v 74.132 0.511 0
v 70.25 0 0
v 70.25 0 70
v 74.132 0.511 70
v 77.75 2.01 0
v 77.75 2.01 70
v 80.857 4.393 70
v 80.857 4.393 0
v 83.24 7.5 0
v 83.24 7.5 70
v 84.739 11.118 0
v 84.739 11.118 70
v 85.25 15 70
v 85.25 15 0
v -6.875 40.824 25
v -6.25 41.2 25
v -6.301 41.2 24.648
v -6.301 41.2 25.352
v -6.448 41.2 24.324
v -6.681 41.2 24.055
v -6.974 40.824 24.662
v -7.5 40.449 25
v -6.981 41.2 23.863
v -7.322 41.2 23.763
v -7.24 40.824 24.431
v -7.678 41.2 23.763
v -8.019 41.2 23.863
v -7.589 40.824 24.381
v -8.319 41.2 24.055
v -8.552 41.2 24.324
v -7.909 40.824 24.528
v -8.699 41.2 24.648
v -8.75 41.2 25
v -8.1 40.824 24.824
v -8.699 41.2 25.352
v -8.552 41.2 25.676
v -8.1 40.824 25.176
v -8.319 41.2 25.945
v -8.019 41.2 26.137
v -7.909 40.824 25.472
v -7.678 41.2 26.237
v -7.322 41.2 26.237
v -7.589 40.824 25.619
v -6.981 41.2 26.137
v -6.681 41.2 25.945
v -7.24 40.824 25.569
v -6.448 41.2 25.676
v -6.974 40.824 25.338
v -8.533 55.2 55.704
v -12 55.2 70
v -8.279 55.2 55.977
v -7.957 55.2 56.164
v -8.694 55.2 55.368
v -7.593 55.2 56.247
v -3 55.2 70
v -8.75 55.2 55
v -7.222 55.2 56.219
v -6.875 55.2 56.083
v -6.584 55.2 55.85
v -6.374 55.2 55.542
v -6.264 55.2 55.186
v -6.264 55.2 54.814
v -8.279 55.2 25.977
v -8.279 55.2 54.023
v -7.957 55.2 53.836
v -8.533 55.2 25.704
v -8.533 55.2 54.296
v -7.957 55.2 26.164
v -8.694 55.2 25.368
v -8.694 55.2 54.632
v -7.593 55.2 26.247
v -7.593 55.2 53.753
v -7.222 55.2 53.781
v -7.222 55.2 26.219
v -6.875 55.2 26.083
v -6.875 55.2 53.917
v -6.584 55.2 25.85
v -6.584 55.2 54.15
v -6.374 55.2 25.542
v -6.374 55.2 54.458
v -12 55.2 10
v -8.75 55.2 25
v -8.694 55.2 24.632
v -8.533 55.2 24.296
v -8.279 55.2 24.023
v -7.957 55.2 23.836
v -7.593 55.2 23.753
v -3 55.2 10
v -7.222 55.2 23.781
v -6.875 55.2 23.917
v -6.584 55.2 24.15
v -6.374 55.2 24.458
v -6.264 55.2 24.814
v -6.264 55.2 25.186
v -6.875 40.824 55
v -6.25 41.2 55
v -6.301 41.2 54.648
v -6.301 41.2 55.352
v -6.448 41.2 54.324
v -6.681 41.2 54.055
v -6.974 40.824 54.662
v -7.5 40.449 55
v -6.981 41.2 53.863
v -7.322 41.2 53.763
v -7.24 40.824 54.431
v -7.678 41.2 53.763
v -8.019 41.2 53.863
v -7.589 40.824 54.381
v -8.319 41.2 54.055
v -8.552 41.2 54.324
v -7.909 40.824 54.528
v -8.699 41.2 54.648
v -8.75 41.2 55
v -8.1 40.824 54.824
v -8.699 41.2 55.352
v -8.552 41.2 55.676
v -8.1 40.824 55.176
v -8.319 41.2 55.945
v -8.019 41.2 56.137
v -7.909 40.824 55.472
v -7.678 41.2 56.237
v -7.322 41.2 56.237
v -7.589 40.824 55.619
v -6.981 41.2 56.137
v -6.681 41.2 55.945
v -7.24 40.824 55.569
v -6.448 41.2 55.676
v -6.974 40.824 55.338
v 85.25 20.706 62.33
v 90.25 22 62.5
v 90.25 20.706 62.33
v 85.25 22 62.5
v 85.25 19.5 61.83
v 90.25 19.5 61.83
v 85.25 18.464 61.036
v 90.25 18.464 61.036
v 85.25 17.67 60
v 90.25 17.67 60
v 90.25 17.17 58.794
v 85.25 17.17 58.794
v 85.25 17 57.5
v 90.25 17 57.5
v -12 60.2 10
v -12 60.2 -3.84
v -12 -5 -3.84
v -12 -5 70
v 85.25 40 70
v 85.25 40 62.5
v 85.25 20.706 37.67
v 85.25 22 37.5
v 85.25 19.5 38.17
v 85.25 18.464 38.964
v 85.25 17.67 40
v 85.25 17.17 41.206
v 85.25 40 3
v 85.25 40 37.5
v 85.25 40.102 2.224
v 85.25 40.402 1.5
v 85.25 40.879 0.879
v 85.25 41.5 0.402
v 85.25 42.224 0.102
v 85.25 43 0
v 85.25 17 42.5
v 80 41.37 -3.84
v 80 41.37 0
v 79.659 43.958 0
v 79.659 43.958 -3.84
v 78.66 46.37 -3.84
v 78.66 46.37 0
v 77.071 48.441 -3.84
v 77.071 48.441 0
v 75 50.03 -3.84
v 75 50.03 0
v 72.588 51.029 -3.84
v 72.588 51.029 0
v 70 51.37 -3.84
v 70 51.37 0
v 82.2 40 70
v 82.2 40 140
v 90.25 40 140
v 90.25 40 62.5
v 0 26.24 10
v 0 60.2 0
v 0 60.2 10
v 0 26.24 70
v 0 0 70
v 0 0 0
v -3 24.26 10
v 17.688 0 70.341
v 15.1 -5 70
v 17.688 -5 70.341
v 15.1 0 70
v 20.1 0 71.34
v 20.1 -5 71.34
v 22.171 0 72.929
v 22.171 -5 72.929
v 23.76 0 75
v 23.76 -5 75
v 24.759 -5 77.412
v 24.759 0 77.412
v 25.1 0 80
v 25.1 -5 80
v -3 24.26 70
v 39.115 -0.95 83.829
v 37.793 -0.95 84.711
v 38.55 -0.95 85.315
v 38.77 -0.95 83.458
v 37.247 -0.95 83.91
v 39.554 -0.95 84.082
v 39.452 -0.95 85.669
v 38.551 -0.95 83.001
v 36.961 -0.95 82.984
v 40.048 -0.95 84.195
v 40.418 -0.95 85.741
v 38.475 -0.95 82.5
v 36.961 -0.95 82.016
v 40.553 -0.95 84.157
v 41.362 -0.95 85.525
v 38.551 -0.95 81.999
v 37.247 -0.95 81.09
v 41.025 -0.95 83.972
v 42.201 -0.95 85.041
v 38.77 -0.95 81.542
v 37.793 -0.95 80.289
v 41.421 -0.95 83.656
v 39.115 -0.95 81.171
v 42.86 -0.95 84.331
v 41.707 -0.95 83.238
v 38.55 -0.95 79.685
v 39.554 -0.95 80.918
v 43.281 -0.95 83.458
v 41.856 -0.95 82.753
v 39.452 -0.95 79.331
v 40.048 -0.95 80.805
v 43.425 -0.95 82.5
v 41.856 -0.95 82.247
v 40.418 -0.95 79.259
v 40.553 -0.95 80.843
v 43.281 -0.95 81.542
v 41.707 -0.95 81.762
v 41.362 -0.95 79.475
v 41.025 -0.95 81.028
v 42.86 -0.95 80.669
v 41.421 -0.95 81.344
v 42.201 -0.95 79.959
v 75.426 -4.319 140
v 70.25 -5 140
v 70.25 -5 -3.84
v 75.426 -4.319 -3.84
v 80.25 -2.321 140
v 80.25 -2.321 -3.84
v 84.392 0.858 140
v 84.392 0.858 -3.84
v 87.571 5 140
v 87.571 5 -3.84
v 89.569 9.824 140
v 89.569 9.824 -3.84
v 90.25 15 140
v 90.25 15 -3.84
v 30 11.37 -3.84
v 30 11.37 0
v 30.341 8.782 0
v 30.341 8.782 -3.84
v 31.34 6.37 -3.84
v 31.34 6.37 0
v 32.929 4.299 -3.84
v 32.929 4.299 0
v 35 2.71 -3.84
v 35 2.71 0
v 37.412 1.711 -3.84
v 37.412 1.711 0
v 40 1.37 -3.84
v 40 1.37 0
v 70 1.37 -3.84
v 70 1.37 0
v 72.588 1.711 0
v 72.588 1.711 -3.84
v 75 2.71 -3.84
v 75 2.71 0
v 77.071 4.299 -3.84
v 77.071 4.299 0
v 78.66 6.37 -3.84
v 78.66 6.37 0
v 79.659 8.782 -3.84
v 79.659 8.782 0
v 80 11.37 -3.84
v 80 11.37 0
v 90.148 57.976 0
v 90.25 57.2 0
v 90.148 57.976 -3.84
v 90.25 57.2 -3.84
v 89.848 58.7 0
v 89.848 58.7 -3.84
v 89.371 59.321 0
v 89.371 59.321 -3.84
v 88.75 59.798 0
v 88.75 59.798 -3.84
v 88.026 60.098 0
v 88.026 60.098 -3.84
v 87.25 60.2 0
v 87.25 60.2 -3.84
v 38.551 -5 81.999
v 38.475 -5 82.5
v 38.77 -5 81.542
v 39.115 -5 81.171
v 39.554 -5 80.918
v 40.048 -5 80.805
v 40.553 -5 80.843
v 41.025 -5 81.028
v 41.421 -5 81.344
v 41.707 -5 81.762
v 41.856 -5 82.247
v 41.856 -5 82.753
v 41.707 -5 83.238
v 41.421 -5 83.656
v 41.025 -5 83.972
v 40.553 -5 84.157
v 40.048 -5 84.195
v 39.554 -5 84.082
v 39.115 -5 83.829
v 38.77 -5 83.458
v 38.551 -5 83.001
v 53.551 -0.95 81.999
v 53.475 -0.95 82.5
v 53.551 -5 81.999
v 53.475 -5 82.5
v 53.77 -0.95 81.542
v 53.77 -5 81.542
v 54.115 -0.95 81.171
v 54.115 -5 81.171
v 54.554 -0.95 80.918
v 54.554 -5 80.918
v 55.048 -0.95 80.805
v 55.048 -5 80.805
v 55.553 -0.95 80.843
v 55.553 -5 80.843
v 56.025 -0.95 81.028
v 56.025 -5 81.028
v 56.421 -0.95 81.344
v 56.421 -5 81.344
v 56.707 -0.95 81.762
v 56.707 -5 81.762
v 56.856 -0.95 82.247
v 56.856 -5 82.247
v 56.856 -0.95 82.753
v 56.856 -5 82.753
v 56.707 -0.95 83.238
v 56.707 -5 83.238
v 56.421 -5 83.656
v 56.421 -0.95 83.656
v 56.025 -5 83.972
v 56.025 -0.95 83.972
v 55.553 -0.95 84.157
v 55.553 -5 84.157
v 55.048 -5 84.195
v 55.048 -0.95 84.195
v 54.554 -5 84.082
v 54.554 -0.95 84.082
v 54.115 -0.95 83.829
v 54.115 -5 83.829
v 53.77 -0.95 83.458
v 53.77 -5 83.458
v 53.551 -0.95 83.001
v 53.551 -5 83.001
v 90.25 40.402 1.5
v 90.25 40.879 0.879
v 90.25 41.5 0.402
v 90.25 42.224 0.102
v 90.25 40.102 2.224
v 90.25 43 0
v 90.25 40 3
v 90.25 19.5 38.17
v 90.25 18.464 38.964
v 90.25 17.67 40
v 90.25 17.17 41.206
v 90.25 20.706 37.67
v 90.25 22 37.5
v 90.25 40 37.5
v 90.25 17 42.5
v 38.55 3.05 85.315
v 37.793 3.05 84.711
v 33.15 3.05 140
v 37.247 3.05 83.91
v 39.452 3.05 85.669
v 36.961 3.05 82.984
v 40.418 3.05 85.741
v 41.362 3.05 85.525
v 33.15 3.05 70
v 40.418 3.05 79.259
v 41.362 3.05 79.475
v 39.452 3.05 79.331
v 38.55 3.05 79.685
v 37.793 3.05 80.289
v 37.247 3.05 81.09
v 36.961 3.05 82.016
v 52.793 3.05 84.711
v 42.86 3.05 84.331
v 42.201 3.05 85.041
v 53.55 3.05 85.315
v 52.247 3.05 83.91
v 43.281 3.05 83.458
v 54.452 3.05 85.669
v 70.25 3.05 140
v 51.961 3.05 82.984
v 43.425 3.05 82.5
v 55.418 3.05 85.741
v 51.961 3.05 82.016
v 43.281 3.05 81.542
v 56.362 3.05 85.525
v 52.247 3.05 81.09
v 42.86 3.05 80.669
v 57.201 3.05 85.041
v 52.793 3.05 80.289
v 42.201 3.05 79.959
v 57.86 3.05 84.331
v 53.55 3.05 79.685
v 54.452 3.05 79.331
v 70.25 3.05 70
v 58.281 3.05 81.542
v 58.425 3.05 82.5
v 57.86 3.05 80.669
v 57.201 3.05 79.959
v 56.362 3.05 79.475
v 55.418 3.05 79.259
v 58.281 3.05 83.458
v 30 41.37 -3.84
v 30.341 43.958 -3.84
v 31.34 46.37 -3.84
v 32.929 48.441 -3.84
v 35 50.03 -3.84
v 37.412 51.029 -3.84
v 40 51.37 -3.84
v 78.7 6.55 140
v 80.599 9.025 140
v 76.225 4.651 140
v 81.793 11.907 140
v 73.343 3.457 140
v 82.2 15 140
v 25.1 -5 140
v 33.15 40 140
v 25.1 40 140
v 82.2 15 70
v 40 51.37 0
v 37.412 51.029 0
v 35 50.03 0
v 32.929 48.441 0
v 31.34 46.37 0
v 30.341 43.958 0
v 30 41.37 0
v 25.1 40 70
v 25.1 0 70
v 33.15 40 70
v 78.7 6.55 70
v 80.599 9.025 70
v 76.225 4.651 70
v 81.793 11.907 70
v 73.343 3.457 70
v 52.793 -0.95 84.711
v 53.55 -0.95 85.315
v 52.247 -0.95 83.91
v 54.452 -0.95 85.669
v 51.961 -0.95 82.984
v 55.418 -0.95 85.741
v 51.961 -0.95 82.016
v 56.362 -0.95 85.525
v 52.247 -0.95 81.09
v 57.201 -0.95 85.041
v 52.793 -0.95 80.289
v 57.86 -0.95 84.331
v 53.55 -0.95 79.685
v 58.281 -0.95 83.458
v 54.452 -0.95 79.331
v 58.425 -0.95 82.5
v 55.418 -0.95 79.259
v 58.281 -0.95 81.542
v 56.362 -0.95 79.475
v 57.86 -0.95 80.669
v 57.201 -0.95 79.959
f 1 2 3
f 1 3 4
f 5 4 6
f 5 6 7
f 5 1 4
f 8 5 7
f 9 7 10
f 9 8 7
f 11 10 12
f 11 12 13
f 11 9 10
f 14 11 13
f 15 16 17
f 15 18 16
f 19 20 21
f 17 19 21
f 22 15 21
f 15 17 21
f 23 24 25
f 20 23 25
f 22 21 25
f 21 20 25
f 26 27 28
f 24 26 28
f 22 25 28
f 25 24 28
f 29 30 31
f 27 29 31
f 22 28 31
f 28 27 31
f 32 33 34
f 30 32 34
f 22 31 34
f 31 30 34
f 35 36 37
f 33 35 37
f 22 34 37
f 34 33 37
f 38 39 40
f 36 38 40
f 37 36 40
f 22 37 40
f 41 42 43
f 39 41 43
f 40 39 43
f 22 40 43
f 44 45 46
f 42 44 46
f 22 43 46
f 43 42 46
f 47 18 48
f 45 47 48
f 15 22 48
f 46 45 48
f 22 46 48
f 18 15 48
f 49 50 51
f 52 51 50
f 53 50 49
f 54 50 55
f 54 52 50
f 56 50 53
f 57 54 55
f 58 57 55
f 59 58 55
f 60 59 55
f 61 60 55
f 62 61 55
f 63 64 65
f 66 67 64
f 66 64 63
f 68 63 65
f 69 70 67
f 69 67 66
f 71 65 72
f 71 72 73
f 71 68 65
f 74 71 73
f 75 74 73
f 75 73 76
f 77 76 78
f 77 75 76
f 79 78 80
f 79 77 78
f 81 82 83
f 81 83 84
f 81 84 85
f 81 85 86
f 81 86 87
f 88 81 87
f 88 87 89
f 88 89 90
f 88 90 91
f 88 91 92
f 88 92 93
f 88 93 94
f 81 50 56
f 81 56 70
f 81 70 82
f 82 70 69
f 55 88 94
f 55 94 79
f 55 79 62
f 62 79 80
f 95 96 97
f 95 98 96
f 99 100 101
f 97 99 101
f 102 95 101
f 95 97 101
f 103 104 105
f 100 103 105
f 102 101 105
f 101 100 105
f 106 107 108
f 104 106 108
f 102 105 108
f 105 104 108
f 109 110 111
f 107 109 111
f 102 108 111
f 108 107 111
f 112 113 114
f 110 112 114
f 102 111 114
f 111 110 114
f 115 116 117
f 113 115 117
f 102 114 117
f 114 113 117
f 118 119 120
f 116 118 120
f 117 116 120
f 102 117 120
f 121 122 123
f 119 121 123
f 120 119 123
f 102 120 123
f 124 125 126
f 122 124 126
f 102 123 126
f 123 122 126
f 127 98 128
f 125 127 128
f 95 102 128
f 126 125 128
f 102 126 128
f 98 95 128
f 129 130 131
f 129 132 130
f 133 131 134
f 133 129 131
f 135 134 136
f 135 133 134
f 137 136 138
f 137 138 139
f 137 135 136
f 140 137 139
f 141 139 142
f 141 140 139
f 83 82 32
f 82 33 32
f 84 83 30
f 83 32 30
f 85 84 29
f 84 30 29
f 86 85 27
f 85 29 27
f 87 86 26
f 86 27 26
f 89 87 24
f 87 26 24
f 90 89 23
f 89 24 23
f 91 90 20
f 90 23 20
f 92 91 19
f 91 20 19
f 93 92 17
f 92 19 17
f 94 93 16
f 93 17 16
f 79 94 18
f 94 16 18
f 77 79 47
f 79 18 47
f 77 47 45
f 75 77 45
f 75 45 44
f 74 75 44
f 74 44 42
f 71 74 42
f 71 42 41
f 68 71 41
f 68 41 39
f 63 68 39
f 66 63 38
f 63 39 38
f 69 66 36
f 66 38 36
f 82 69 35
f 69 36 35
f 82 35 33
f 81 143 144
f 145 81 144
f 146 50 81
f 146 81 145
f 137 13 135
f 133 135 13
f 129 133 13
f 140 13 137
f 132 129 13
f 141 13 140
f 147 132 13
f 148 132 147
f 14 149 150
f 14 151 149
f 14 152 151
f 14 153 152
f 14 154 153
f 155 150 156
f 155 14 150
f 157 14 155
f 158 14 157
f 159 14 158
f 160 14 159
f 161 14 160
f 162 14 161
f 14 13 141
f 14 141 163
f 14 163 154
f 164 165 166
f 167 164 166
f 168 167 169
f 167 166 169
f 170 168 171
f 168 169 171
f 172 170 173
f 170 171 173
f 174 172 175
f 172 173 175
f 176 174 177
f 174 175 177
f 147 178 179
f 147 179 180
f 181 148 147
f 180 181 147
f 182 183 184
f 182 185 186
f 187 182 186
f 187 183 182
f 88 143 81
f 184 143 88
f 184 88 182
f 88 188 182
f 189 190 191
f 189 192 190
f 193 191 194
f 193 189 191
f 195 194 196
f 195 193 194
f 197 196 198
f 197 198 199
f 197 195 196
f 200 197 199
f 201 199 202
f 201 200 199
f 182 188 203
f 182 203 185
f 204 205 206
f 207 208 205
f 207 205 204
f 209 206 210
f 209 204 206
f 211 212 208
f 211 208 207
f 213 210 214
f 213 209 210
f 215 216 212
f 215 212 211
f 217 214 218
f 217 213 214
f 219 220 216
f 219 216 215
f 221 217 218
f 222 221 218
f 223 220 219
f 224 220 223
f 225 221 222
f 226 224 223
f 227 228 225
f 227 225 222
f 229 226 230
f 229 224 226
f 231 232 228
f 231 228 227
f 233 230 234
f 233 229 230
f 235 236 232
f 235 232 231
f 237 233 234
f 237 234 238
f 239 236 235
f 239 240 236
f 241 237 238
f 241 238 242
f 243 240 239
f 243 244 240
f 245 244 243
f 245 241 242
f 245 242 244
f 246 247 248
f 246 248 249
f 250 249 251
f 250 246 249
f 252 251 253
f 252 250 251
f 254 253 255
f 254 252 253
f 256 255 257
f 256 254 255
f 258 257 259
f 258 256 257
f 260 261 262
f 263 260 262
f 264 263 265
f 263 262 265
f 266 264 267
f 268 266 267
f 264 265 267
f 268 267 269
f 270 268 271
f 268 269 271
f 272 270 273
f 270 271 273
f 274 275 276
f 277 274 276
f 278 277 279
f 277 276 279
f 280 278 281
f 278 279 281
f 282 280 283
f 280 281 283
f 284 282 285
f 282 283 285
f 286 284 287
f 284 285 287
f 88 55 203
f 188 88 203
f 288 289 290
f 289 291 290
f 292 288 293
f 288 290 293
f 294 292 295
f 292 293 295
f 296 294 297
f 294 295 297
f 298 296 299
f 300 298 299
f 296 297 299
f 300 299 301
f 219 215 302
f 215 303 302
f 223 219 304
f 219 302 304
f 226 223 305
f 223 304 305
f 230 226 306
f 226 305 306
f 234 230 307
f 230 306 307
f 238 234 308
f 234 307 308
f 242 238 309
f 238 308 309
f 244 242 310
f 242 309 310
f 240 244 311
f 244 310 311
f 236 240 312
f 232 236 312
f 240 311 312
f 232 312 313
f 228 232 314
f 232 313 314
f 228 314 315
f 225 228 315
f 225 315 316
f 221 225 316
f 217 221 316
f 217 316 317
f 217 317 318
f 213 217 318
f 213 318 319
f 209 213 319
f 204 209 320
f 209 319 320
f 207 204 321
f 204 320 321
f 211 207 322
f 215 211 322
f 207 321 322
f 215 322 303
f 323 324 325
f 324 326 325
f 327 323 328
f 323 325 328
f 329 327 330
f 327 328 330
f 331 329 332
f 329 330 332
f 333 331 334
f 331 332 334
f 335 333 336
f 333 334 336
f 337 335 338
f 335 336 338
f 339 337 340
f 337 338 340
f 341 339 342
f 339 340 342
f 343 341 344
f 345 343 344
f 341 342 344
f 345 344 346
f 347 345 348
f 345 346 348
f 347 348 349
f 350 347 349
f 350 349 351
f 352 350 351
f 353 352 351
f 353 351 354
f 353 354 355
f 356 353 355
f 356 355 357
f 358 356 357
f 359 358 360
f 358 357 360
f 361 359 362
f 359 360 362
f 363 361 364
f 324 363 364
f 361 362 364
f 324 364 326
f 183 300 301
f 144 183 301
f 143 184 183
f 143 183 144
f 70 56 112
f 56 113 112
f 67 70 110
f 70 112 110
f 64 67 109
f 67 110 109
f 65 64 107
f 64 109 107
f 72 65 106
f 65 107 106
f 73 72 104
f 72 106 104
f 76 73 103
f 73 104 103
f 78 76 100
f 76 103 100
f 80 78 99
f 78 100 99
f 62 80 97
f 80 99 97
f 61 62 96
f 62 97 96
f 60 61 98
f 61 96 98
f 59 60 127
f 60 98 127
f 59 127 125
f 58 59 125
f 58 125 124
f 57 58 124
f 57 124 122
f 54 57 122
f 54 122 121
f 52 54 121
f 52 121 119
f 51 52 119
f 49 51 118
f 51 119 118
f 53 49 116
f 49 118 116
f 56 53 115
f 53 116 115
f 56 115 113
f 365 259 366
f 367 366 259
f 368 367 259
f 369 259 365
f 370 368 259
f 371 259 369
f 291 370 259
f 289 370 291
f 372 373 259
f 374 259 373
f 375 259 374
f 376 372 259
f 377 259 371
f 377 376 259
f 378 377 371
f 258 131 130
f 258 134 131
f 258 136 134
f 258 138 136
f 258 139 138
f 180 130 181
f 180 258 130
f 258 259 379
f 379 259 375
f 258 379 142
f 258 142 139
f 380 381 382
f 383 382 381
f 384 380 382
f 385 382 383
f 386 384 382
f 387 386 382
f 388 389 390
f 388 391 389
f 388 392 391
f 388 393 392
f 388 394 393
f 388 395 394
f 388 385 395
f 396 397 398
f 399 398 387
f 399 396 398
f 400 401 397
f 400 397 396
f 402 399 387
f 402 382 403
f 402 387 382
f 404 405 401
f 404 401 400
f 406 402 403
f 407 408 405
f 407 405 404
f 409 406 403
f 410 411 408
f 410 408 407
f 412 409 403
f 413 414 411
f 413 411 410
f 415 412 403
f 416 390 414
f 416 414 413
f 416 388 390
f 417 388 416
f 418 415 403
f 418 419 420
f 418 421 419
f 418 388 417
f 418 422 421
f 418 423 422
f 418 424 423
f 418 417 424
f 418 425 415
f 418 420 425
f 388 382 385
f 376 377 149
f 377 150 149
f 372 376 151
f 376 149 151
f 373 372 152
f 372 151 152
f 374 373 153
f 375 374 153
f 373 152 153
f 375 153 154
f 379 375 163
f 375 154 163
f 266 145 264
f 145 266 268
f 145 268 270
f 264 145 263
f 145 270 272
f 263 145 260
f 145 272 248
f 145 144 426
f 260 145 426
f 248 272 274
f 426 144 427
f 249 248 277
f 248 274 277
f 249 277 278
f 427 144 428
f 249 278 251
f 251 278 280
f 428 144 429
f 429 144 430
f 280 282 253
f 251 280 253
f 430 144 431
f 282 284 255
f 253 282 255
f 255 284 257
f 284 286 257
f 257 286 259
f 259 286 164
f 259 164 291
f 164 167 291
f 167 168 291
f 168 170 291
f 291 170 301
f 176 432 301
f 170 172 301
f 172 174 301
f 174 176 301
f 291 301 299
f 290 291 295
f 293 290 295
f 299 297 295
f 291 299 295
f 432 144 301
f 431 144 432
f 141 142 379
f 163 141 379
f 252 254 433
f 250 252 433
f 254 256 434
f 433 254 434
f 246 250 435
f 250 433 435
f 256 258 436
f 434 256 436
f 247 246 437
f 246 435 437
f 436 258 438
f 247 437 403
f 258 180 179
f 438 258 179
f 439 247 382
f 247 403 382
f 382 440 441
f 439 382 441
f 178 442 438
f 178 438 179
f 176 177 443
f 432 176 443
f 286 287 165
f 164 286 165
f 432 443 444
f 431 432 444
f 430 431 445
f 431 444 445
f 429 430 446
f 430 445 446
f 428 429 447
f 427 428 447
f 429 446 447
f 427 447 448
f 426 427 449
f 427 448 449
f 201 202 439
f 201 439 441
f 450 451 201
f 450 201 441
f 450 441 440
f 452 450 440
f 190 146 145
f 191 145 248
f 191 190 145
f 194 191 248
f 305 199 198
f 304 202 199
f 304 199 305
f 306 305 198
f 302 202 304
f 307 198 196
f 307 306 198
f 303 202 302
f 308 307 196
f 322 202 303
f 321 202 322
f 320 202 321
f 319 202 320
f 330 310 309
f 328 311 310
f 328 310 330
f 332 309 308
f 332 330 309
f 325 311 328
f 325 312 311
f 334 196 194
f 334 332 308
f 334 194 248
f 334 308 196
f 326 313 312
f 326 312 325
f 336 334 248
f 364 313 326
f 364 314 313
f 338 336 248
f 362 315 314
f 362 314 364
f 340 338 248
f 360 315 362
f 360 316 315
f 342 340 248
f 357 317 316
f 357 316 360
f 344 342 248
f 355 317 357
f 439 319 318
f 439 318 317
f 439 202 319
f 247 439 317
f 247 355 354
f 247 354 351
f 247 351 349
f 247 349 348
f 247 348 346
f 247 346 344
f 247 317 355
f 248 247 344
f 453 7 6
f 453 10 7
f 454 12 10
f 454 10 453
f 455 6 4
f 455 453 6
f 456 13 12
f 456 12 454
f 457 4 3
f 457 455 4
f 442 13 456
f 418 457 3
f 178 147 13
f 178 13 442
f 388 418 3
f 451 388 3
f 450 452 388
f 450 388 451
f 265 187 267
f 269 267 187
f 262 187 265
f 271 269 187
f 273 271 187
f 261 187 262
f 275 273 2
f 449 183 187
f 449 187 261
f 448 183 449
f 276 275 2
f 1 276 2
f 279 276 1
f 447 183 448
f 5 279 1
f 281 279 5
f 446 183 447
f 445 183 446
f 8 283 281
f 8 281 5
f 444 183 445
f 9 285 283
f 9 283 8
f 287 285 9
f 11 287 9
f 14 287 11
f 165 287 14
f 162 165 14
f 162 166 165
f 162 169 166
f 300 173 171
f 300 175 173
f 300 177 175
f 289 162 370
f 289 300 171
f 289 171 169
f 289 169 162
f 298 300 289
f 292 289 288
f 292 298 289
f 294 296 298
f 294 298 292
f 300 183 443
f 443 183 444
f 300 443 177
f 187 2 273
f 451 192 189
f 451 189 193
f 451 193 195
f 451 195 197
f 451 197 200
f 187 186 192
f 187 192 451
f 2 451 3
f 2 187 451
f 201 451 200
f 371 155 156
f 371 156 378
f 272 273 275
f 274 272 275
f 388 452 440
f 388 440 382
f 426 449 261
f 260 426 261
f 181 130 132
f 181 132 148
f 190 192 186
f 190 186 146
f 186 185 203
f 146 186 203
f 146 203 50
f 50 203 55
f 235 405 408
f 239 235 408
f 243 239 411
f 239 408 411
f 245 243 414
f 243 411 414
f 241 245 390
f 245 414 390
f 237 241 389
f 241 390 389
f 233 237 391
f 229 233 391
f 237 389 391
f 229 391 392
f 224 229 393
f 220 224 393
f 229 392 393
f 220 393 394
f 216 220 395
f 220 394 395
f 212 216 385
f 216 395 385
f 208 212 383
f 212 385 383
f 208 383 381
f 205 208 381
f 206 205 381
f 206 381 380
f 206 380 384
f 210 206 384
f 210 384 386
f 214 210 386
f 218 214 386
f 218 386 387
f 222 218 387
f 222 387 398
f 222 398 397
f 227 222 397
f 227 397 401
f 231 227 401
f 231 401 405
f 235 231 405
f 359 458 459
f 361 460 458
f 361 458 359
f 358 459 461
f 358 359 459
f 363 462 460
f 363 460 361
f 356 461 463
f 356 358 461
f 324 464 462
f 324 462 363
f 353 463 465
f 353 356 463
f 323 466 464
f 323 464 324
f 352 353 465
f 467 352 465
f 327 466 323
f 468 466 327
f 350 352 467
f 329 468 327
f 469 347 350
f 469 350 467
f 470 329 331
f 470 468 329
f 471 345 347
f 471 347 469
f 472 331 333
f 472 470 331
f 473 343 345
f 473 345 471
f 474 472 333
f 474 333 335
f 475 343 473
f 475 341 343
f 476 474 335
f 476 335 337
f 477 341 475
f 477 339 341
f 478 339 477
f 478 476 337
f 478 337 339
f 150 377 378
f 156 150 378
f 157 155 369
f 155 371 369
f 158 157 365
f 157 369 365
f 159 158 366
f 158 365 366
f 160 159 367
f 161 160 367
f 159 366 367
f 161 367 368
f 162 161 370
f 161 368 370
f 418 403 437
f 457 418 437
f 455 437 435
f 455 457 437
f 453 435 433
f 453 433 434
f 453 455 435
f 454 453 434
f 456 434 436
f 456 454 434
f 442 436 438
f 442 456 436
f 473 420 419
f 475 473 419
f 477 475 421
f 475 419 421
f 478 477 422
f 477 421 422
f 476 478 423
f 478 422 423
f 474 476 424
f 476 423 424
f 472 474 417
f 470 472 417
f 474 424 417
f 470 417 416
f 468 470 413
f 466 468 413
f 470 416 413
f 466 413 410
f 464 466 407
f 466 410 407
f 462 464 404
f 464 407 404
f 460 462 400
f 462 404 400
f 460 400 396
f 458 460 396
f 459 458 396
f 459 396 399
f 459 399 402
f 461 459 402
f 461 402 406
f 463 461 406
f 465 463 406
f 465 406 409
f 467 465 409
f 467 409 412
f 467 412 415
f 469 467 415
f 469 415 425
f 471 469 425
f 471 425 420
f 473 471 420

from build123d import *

# Parameters (mm, degrees)
BOSS_EXTRUDE1_DEPTH            = 70
BOSS_EXTRUDE2_DEPTH            = 70
CUT_EXTRUDE1_DEPTH             = 60
SKETCH13_W                     = 9
SKETCH13_H                     = 60
CUT_EXTRUDE3_DEPTH             = 5
SKETCH12_W                     = 25
SKETCH12_H                     = 23
CUT_EXTRUDE2_DEPTH             = 5
BOSS_EXTRUDE3_DEPTH            = 3.84
CBORE_FOR_M3_SHCS1_D           = 3.4
CBORE_FOR_M3_SHCS1_DEPTH       = 8.05
CBORE_FOR_M3_SHCS1_CBORE_D     = 6.5
CBORE_FOR_M3_SHCS1_CBORE_DEPTH = 4
CBORE_FOR_M3_SHCS1_TIP         = 1.021463052
M3X0_5_TAPPED_HOLE1_D          = 2.5
M3X0_5_TAPPED_HOLE1_DEPTH      = 14
M3X0_5_TAPPED_HOLE1_TIP        = 0.751075774
FILLET1_R                      = 10
FILLET4_R                      = 5
FILLET5_R                      = 3


with BuildPart() as part:
    # Sketch3 → Boss-Extrude1 (new body)
    with BuildSketch(Plane.XY):
        with BuildLine():
            Line((85.25, 15), (85.25, 40))
            Line((85.25, 40), (90.25, 40))
            Line((90.25, 40), (90.25, 15))
            ThreePointArc((90.25, 15), (84.392135624, 0.857864376), (70.25, -5))
            Line((70.25, -5), (-12, -5))
            Line((-12, -5), (-12, 60.2))
            Line((-12, 60.2), (0, 60.2))
            Line((0, 60.2), (0, 0))
            Line((0, 0), (70.25, 0))
            ThreePointArc((70.25, 0), (80.856601718, 4.393398282), (85.25, 15))
        make_face()
    extrude(amount=BOSS_EXTRUDE1_DEPTH)

    # Sketch5 → Boss-Extrude2 (add)
    with BuildSketch(Plane.XY.offset(70)):
        with BuildLine():
            Line((82.2, 15), (82.2, 40))
            Line((82.2, 40), (90.25, 40))
            Line((90.25, 40), (90.25, 15))
            ThreePointArc((90.25, 15), (84.392135624, 0.857864376), (70.25, -5))
            Line((70.25, -5), (25.1, -5))
            Line((25.1, -5), (25.1, 40))
            Line((25.1, 40), (33.15, 40))
            Line((33.15, 40), (33.15, 3.05))
            Line((33.15, 3.05), (70.25, 3.05))
            ThreePointArc((70.25, 3.05), (78.699926035, 6.550073965), (82.2, 15))
        make_face()
    extrude(amount=BOSS_EXTRUDE2_DEPTH)

    # Sketch6 → Cut-Extrude1 (cut)
    with BuildSketch(Plane.XY.offset(70)):
        Polygon((-3, 24.26), (0, 26.24), (0, 60.2), (-3, 60.2), align=None)
    extrude(amount=-CUT_EXTRUDE1_DEPTH, mode=Mode.SUBTRACT)

    # Sketch13 → Cut-Extrude3 (cut)
    with BuildSketch(Plane(origin=(0, 60.2, 0), x_dir=(1, 0, 0), z_dir=(0, 1, 0))):
        with Locations((-7.5, -40)):
            Rectangle(SKETCH13_W, SKETCH13_H)
    extrude(amount=-CUT_EXTRUDE3_DEPTH, mode=Mode.SUBTRACT)

    # Sketch12 → Cut-Extrude2 (cut)
    with BuildSketch(Plane(origin=(90.25, 0, 0), x_dir=(0, 0, -1), z_dir=(1, 0, 0))):
        with Locations((-50, 28.5)):
            Rectangle(SKETCH12_W, SKETCH12_H)
    extrude(amount=-CUT_EXTRUDE2_DEPTH, mode=Mode.SUBTRACT)

    # Sketch7 → Boss-Extrude3 (add)
    with BuildSketch(Plane.XY):
        with BuildLine():
            Line((-12, 60.2), (-12, -5))
            Line((-12, -5), (70.25, -5))
            ThreePointArc((70.25, -5), (84.392135624, 0.857864376), (90.25, 15))
            Line((90.25, 15), (90.25, 60.2))
            Line((90.25, 60.2), (-12, 60.2))
        make_face()
        with BuildLine():
            Line((70, 51.37), (40, 51.37))
            ThreePointArc((40, 51.37), (32.928932188, 48.441067812), (30, 41.37))
            Line((30, 41.37), (30, 11.37))
            ThreePointArc((30, 11.37), (32.928932188, 4.298932188), (40, 1.37))
            Line((40, 1.37), (70, 1.37))
            ThreePointArc((70, 1.37), (77.071067812, 4.298932188), (80, 11.37))
            Line((80, 11.37), (80, 41.37))
            ThreePointArc((80, 41.37), (77.071067812, 48.441067812), (70, 51.37))
        make_face(mode=Mode.SUBTRACT)
    extrude(amount=-BOSS_EXTRUDE3_DEPTH)

    # CBORE for M3 SHCS1
    with Locations(Plane(origin=(0, 3.05, 0), x_dir=(1, 0, 0), z_dir=(0, 1, 0))):
        with Locations((40.175, -82.5), (55.175, -82.5)):
            CounterBoreHole(CBORE_FOR_M3_SHCS1_D / 2, CBORE_FOR_M3_SHCS1_CBORE_D / 2, CBORE_FOR_M3_SHCS1_CBORE_DEPTH, depth=CBORE_FOR_M3_SHCS1_DEPTH)
            with Locations((0, 0, -(CBORE_FOR_M3_SHCS1_DEPTH + CBORE_FOR_M3_SHCS1_TIP / 2))):  # 118° drill point
                Cone(0, CBORE_FOR_M3_SHCS1_D / 2, CBORE_FOR_M3_SHCS1_TIP, mode=Mode.SUBTRACT)

    # M3x0.5 Tapped Hole1
    with Locations(Plane(origin=(0, 55.2, 0), x_dir=(1, 0, 0), z_dir=(0, 1, 0))):
        with Locations((-7.5, -25), (-7.5, -55)):
            Hole(M3X0_5_TAPPED_HOLE1_D / 2, depth=M3X0_5_TAPPED_HOLE1_DEPTH)
            with Locations((0, 0, -(M3X0_5_TAPPED_HOLE1_DEPTH + M3X0_5_TAPPED_HOLE1_TIP / 2))):  # 118° drill point
                Cone(0, M3X0_5_TAPPED_HOLE1_D / 2, M3X0_5_TAPPED_HOLE1_TIP, mode=Mode.SUBTRACT)

    # Fillet1
    fillet1_edges = [part.edges().sort_by_distance(p)[0] for p in [
        (25.1, -2.5, 70),
    ]]
    fillet(fillet1_edges, radius=FILLET1_R)

    # Fillet4
    fillet4_edges = [part.edges().sort_by_distance(p)[0] for p in [
        (87.75, 17, 37.5),
        (87.75, 17, 62.5),
    ]]
    fillet(fillet4_edges, radius=FILLET4_R)

    # Fillet5
    fillet5_edges = [part.edges().sort_by_distance(p)[0] for p in [
        (87.75, 40, 0),
        (90.25, 60.2, -1.92),
    ]]
    fillet(fillet5_edges, radius=FILLET5_R)


solid = part.part
